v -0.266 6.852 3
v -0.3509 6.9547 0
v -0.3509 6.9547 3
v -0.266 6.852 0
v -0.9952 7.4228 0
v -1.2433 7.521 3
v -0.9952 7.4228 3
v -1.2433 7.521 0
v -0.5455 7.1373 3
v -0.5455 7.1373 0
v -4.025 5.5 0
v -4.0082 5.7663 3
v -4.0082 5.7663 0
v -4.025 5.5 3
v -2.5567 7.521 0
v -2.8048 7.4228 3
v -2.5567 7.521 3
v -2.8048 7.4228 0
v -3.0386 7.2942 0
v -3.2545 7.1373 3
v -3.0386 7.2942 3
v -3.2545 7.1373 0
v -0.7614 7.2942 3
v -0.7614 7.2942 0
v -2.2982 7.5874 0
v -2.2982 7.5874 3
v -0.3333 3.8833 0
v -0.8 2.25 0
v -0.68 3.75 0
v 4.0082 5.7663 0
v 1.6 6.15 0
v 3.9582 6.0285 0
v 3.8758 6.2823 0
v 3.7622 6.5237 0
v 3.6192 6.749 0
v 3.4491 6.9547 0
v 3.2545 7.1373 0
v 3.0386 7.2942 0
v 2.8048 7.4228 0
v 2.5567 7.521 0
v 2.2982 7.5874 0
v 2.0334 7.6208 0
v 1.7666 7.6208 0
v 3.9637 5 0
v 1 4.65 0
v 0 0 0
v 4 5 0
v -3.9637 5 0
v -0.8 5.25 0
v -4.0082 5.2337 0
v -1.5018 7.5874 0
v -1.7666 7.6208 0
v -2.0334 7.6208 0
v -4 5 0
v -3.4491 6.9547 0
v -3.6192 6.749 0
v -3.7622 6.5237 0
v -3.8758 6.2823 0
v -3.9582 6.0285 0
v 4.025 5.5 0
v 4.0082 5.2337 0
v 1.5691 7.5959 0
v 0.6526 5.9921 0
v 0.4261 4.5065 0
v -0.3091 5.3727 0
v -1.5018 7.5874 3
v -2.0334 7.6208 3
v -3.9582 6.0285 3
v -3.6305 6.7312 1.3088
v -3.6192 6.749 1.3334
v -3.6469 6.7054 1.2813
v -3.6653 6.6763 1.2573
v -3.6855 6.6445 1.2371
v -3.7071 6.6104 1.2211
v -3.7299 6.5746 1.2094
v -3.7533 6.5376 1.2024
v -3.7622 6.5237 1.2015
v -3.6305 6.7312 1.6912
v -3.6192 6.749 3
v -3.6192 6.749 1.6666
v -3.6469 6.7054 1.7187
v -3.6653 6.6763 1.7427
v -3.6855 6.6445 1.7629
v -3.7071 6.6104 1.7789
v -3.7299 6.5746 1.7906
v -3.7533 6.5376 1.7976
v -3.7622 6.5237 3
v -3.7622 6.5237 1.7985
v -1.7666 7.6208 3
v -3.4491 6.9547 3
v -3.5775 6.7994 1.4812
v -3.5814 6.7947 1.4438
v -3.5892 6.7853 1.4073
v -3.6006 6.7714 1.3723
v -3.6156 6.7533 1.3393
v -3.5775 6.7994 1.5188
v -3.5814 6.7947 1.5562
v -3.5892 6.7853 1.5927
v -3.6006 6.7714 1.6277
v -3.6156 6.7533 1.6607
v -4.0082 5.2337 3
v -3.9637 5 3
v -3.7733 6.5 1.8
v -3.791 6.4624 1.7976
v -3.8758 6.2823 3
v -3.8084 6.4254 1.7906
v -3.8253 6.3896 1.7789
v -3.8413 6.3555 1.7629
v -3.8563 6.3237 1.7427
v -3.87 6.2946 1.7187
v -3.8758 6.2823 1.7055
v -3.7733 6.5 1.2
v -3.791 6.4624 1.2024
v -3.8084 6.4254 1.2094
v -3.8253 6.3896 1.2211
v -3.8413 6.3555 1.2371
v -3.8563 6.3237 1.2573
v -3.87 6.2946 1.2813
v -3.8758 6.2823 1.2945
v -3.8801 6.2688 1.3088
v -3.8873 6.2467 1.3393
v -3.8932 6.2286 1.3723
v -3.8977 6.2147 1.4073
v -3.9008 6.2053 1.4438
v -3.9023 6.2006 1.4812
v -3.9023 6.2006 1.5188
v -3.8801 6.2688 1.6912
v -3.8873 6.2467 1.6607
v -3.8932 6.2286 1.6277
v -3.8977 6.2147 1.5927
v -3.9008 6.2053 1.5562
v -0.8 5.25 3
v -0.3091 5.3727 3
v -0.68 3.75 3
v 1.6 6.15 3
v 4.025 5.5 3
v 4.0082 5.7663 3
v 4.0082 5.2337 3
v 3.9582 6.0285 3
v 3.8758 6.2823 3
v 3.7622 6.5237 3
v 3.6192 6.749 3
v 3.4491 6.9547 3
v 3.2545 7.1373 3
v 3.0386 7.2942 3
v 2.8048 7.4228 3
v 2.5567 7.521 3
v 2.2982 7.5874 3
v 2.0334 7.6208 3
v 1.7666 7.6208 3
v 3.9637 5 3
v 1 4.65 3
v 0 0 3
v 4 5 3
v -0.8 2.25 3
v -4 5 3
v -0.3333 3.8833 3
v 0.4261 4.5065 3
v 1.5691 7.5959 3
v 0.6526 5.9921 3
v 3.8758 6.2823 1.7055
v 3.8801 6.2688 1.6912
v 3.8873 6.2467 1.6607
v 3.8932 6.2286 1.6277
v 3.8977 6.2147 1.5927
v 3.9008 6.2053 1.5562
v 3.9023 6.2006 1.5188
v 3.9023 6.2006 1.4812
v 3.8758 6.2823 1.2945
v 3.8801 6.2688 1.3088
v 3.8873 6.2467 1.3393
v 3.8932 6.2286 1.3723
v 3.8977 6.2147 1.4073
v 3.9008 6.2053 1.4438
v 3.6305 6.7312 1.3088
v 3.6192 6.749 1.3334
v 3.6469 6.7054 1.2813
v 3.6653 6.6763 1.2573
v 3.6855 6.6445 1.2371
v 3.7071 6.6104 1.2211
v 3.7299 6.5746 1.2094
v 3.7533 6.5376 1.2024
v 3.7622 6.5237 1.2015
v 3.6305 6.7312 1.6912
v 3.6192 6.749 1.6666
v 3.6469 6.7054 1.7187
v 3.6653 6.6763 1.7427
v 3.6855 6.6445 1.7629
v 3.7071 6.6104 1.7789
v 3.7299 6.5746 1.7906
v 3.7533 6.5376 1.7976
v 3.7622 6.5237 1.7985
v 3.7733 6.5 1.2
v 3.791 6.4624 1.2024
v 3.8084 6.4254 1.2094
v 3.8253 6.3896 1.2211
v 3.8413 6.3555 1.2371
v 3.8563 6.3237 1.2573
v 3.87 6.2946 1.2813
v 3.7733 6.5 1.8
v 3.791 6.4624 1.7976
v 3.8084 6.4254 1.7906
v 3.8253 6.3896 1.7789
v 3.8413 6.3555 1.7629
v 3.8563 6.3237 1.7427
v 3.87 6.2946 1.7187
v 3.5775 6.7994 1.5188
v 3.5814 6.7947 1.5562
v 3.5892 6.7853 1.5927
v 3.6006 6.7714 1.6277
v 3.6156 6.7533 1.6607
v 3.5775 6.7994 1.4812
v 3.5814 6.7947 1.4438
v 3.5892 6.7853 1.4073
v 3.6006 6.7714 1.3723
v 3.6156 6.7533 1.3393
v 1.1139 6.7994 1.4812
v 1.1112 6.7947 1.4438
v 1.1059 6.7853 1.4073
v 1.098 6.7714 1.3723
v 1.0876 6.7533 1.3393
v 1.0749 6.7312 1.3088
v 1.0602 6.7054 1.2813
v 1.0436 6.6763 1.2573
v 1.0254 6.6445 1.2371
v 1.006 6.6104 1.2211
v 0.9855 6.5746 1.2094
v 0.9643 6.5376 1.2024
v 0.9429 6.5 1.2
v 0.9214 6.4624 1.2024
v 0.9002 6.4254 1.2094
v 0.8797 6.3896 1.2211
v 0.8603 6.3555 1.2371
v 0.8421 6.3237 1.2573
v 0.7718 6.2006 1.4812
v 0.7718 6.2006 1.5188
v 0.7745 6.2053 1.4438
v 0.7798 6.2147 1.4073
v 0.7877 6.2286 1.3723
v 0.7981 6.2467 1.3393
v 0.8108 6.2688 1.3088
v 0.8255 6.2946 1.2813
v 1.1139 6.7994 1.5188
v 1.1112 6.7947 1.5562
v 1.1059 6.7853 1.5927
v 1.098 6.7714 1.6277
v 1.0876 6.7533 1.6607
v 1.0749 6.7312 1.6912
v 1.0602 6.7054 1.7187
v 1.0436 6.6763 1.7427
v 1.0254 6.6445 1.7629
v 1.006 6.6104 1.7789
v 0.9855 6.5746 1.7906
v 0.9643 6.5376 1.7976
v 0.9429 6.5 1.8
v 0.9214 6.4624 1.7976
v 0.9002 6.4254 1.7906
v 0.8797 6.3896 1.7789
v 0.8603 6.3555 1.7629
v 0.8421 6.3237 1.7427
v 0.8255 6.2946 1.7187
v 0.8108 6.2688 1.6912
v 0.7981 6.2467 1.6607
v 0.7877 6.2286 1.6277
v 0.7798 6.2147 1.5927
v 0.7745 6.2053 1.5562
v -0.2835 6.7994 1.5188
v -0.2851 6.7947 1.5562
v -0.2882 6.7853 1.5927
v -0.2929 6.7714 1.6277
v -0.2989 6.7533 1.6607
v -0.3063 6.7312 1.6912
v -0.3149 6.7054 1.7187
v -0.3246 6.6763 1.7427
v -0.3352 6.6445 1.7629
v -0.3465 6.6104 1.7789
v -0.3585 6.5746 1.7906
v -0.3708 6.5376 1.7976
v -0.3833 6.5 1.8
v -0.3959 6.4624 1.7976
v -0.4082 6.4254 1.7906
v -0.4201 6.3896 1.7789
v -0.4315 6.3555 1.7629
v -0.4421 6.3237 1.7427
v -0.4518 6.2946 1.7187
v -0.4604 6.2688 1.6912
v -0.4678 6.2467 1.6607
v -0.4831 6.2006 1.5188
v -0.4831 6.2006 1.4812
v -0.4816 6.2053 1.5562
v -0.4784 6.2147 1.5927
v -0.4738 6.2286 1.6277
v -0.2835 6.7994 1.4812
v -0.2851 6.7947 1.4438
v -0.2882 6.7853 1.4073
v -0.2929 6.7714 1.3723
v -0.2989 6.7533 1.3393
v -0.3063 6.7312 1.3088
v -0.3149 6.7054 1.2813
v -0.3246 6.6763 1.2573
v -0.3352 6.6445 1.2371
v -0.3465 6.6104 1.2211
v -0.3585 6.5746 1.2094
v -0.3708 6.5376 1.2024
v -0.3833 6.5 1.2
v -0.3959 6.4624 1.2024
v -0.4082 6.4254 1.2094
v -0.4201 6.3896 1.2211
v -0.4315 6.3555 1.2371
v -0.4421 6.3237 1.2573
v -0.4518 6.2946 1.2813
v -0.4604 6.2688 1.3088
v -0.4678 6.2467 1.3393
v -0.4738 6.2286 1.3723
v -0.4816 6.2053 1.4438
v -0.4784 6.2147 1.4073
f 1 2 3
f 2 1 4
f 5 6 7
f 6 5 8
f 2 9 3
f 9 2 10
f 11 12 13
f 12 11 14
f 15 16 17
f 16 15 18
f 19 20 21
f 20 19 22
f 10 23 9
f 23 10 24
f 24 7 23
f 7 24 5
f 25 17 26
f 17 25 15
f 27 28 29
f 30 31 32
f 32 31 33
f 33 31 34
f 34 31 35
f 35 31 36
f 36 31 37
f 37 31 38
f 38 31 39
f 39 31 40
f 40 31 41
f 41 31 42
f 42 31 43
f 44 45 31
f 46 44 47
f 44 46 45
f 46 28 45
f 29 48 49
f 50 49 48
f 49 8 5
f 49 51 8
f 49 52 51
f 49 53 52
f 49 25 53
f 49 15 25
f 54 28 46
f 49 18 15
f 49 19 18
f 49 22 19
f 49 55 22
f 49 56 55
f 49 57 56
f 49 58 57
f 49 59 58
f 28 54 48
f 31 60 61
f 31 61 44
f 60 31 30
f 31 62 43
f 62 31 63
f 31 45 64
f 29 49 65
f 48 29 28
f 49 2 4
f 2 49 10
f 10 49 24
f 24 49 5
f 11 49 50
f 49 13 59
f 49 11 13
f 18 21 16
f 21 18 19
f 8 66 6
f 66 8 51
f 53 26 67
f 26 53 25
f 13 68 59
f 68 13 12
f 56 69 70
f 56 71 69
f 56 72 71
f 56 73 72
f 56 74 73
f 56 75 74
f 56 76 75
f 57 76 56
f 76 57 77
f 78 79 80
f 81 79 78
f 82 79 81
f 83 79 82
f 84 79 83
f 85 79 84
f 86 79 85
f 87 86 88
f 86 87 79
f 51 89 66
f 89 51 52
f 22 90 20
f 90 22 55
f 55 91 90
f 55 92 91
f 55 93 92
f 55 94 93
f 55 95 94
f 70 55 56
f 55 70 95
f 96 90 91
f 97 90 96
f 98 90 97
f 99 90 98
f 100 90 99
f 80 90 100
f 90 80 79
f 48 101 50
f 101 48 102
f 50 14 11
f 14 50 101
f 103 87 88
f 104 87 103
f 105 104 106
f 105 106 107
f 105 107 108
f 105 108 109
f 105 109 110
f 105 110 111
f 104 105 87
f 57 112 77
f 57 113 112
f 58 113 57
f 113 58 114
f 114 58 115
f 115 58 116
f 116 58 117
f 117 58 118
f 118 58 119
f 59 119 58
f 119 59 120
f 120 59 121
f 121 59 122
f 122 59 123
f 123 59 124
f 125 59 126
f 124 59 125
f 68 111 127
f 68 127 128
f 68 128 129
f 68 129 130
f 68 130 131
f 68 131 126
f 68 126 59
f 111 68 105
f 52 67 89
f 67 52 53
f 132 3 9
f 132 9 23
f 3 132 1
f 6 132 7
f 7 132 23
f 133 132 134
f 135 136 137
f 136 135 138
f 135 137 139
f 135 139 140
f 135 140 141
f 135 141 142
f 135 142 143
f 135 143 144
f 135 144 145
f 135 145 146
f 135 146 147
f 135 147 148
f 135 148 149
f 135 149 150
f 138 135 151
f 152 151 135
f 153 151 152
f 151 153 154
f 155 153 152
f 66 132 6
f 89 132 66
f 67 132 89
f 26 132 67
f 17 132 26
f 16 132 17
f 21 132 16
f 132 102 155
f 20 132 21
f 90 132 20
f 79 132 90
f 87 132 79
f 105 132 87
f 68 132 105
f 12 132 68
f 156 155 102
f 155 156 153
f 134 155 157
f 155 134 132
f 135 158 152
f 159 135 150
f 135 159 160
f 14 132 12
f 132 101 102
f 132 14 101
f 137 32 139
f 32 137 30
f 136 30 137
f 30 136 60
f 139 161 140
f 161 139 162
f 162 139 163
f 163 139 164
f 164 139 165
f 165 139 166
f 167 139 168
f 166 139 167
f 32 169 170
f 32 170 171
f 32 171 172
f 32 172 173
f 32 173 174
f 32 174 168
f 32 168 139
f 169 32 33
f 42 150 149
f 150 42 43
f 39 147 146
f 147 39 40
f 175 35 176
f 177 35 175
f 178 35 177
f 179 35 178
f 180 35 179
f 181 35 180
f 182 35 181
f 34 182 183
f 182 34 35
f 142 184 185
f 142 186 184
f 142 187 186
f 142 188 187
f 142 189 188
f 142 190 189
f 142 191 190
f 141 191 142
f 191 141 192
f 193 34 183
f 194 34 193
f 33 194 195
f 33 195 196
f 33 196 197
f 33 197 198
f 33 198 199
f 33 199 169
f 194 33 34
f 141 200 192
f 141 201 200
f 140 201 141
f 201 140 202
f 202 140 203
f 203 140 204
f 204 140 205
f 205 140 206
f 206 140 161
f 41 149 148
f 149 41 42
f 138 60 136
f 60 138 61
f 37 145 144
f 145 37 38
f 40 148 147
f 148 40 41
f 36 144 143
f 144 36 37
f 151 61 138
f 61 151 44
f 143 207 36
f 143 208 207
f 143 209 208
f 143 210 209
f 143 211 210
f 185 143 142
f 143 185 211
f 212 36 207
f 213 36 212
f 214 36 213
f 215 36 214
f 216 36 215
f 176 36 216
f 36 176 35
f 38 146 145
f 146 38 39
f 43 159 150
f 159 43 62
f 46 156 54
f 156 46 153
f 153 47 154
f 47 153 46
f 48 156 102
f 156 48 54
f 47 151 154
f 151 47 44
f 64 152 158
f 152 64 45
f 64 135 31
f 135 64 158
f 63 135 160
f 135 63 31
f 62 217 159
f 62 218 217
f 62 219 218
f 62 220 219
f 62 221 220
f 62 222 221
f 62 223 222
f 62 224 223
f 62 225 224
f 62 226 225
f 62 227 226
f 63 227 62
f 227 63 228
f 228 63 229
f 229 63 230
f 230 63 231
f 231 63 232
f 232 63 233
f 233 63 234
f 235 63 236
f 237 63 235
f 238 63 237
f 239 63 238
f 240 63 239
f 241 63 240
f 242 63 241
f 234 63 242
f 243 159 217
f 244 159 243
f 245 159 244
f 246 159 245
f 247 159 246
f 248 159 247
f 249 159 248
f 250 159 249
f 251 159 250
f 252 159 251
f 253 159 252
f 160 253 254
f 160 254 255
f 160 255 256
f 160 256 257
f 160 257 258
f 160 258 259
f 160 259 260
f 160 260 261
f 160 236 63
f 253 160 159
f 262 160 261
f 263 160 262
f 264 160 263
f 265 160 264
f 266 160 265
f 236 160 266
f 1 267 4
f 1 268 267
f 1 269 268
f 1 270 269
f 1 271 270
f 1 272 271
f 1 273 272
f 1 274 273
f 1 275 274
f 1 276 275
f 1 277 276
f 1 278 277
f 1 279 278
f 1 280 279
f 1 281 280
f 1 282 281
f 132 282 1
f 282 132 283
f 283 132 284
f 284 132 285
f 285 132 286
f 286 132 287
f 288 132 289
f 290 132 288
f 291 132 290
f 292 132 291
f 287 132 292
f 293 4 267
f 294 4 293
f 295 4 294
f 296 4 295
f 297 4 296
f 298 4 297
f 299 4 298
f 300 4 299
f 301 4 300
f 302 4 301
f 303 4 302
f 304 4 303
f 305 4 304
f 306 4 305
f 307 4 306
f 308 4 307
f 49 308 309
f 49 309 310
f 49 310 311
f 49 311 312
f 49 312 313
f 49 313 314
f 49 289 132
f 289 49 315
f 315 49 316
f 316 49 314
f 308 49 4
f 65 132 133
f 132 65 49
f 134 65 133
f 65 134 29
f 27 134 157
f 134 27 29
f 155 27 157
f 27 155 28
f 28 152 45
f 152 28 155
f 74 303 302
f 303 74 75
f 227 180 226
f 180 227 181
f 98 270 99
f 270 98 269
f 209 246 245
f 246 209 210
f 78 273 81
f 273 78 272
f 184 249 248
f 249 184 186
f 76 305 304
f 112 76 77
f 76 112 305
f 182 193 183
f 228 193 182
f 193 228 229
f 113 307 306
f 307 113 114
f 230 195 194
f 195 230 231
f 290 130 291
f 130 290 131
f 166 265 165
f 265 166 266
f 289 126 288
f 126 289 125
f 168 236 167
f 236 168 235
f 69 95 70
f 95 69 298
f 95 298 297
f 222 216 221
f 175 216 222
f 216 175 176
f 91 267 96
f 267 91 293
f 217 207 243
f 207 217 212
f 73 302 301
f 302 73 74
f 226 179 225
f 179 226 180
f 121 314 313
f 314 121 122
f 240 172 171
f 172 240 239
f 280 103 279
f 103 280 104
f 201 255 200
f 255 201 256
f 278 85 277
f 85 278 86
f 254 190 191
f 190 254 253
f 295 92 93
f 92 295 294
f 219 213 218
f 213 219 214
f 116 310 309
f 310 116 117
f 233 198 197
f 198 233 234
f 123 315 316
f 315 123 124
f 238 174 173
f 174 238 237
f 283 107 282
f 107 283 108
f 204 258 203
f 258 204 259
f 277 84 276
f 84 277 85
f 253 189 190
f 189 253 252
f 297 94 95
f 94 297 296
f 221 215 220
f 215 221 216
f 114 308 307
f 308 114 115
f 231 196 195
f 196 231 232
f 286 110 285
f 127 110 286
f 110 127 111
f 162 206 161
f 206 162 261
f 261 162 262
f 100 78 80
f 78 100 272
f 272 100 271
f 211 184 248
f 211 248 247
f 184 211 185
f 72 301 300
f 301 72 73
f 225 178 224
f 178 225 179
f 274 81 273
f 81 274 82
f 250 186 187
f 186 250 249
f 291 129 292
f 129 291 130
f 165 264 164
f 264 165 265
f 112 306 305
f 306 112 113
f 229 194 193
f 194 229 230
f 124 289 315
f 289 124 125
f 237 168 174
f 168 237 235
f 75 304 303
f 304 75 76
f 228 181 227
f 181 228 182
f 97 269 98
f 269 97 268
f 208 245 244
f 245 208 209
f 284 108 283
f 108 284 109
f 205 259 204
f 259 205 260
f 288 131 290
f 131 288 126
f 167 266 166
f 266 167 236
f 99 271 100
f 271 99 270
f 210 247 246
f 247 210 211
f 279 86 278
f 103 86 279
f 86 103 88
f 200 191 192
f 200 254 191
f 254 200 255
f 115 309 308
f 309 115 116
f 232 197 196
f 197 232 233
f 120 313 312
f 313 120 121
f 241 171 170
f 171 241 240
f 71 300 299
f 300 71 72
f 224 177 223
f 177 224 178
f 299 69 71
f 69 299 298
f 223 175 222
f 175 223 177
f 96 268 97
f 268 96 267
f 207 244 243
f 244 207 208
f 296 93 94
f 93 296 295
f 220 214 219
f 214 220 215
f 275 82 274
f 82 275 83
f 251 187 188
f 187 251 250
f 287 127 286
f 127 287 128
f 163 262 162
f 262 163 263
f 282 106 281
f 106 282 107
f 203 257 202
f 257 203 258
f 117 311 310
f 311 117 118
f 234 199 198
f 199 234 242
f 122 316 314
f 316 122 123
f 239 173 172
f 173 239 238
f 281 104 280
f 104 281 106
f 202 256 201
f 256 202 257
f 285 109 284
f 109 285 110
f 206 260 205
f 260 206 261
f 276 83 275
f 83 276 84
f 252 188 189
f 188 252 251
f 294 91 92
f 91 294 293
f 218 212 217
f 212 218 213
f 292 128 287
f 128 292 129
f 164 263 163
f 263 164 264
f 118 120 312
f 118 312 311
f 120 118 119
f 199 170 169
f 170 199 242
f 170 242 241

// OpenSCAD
$fn = 50;
boltscale = .6;
holesize = .6;
totalscale = 1;

module bolt(){//creates bolt function
linear_extrude(4){//3d bolt
union(){//2d bolt
polygon([[0,0],[1,3],[4,4],[2,.5]]);
polygon([[1,1],[4,1.5],[1.5,-2],[.2,-2.5]]);
polygon([[1,-1.5],[3,-1],[0,-5]]);
}
} 
}



module pendant(){//makes entire pendant
difference(){
difference(){//broken heart
union(){//Heart
difference(){//fixed circles
union(){//circles
translate([-1.9,5.5,0]){cylinder(d=4.25,h=3);}
translate([1.9,5.5,0]){cylinder(d=4.25,h=3);}
}
difference(){//triborder
linear_extrude(3){polygon([[0,0],[4.5,5],[-4.5,5]]);}
linear_extrude(3){polygon([[0,0],[4,5],[-4,5]]);}
}
}
linear_extrude(3){//triangle
    polygon([[0,0],[4,5],[-4,5]]);}
}
translate([-.8,5.25,0]){//moved bolt
scale([boltscale,boltscale,1]){
    bolt();
}
}
}
translate([-5,6.5,1.5]){//hole cylinder
rotate([0,90,0]){cylinder(d=holesize, h=12);}
}
}
}

scale([totalscale,totalscale,totalscale]){
    pendant();
}
